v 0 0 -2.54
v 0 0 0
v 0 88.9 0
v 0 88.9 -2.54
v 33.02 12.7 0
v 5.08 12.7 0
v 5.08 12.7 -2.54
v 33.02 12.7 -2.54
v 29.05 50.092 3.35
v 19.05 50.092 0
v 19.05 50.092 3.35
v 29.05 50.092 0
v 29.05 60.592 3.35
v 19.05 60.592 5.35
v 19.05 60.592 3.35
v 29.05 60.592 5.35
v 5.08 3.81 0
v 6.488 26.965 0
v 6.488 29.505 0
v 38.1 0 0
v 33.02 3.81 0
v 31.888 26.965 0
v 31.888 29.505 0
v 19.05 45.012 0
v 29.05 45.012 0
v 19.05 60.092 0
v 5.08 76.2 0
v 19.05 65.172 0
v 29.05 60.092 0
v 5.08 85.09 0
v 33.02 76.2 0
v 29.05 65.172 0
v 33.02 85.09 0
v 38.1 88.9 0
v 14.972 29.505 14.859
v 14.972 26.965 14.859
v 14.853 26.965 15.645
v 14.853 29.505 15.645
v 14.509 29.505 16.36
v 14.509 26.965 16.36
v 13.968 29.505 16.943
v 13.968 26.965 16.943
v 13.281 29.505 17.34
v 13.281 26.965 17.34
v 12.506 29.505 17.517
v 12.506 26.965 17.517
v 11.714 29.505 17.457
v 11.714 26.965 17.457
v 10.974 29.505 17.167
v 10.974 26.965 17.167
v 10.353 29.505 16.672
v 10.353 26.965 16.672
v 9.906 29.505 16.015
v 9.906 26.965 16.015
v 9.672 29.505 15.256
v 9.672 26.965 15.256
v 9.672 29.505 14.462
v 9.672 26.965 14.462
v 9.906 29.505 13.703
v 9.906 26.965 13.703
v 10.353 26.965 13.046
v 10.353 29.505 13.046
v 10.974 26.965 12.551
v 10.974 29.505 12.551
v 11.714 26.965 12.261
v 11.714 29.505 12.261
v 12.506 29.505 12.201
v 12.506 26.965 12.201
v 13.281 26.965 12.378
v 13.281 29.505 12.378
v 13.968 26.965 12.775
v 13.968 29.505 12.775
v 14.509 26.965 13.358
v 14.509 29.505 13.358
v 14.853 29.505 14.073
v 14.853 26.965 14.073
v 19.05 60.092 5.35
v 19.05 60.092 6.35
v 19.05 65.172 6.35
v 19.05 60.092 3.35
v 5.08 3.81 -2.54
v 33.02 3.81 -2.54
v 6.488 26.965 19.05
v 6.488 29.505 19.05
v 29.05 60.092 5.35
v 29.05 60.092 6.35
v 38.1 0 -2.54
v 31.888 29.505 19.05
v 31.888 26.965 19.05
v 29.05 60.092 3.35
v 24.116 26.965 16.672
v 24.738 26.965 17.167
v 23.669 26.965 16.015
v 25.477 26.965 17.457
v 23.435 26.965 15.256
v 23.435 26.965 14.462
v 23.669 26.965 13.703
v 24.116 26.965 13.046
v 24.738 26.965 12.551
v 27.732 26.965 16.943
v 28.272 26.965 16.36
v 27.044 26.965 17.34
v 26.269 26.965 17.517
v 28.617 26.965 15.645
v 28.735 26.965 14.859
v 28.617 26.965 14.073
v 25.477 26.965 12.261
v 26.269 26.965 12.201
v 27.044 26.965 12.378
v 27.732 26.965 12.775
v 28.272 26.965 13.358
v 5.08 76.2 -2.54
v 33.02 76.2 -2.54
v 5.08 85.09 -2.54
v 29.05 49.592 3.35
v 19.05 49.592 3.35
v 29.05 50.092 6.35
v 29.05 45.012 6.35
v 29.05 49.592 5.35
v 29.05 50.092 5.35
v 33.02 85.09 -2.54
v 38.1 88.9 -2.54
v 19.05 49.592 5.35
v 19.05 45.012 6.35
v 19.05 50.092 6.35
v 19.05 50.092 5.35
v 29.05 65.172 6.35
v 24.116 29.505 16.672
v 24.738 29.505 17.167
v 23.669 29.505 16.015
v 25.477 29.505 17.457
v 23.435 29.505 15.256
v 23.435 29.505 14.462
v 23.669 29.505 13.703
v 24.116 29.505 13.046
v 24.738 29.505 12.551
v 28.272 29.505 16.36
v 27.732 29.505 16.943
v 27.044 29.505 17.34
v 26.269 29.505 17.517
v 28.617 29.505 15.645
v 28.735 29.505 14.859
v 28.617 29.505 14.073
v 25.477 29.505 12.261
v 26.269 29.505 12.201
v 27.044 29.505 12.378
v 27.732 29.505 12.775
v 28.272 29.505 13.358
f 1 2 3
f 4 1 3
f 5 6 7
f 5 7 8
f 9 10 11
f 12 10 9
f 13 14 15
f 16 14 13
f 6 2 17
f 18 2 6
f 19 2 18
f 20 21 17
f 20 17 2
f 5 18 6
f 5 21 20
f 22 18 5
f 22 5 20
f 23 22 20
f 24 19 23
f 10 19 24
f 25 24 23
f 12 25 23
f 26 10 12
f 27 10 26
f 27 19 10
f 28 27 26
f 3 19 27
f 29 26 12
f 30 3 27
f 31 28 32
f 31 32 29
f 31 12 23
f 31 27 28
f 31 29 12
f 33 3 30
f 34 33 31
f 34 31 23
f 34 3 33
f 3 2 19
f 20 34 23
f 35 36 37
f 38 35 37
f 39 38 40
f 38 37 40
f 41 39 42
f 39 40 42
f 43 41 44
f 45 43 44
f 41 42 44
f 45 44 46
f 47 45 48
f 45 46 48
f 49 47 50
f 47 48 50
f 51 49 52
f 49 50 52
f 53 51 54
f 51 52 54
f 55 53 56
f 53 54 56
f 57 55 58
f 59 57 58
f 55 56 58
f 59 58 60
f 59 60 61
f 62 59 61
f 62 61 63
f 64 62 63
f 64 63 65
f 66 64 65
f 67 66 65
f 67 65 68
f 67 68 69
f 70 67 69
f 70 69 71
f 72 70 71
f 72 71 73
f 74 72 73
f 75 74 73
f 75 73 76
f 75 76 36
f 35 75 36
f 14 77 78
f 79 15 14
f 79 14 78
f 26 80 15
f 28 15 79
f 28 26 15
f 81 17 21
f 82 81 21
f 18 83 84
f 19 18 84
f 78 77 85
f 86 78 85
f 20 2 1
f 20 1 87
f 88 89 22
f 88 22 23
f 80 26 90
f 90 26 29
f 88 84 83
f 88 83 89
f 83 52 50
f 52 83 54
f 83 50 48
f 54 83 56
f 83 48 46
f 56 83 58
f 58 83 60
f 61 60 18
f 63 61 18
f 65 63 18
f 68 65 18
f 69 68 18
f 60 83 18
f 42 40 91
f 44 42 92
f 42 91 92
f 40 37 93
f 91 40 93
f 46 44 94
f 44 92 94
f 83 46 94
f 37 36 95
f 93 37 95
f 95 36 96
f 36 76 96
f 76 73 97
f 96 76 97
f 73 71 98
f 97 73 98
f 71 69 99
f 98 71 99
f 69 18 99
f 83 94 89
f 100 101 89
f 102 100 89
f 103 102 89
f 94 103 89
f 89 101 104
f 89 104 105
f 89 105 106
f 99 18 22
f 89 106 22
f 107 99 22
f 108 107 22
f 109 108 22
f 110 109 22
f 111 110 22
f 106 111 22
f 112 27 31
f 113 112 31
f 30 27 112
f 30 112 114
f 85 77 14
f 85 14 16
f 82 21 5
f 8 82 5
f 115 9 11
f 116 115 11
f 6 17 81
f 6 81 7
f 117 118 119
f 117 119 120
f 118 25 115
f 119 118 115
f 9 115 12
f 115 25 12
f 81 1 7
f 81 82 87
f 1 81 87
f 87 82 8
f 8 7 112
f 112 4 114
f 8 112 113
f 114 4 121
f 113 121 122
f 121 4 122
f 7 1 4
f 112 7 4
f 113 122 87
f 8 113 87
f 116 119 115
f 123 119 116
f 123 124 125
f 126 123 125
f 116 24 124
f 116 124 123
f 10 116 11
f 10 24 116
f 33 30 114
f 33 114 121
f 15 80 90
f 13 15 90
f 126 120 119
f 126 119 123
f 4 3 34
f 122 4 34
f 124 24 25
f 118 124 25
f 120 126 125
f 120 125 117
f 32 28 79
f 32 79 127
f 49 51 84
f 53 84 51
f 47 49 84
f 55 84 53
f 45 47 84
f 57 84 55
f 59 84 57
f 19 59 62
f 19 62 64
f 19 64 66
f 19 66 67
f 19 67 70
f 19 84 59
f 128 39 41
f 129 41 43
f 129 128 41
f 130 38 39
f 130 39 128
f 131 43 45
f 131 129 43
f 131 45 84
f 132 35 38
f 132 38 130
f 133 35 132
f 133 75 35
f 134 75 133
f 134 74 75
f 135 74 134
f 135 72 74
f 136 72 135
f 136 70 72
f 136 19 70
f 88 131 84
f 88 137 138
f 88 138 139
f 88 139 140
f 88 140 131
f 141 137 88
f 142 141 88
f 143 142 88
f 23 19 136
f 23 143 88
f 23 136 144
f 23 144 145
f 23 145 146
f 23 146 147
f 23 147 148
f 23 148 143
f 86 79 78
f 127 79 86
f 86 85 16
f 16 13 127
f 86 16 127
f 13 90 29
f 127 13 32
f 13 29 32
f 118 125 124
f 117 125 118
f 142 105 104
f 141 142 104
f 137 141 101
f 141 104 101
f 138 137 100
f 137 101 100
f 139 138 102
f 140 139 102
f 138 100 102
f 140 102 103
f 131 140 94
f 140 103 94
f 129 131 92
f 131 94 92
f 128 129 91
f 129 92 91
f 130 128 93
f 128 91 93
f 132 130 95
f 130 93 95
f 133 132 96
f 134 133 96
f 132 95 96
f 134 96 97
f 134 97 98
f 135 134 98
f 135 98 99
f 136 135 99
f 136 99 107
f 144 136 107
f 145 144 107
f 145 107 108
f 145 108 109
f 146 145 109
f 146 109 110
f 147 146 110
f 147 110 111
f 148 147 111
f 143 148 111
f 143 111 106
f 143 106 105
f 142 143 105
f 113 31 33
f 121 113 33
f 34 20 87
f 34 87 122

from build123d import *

# Parameters (mm, degrees)
F1_W      = 38.1
F1_H      = 88.9
F2_DEPTH  = 2.54
F0_W      = 10
F0_H      = 5.08
F0_W_2    = 25.4
F0_H_2    = 2.54
F3_DEPTH  = 6.35
F4_W      = 10
F4_H      = 2
F5_DEPTH  = 0.5
F6_W      = 10
F6_H      = 2
F7_DEPTH  = 0.5
F8_DEPTH  = 12.7
F9_R      = 2.665
F10_DEPTH = 61.9361865292
F11_W     = 27.94
F11_H     = 8.89
F12_DEPTH = 25.4


with BuildPart() as f2:
    # F1 (on Top) → F2 (new body)
    with BuildSketch(Plane.XY):
        with Locations((19.05, 44.45)):
            Rectangle(F1_W, F1_H)
    extrude(amount=-F2_DEPTH)

    # F0 (on Top) → F3 (join)
    with BuildSketch(Plane.XY):
        with Locations((24.05, 62.6320488313)):
            Rectangle(F0_W, F0_H)
        with Locations((24.05, 47.5520488313)):
            Rectangle(F0_W, F0_H)
        with Locations((19.1884456806, 28.2348134708)):
            Rectangle(F0_W_2, F0_H_2)
    extrude(amount=F3_DEPTH)

    # F4 (on face) → F5 (cut)
    with BuildSketch(Plane(origin=(0, 50.0920488313, 0), x_dir=(-1, 0, 0), z_dir=(0, 1, 0))):
        with Locations((-24.05, 4.35)):
            Rectangle(F4_W, F4_H)
    extrude(amount=-F5_DEPTH, mode=Mode.SUBTRACT)

    # F6 (on face) → F7 (cut)
    with BuildSketch(Plane.XZ.offset(-60.0920488313)):
        with Locations((24.05, 4.35)):
            Rectangle(F6_W, F6_H)
    extrude(amount=-F7_DEPTH, mode=Mode.SUBTRACT)

    # F8 (add): a face of the model
    f8_faces = [f2.faces().sort_by_distance(p)[0] for p in [
        (19.1884456806, 28.2348134708, 6.35),
    ]]
    extrude(f8_faces, amount=F8_DEPTH)

    # F9 (on face) → F10 (cut, through all)
    with BuildSketch(Plane.XZ.offset(-26.9648134708)):
        with Locations((12.3068671674, 14.8589983582)):
            Circle(F9_R)
        with Locations((26.0700241938, 14.8589983582)):
            Circle(F9_R)
    extrude(amount=-F10_DEPTH, mode=Mode.SUBTRACT)

    # F11 (on face) → F12 (cut)
    with BuildSketch(Plane.XY):
        with Locations((19.05, 80.645)):
            Rectangle(F11_W, F11_H)
        with Locations((19.05, 8.255)):
            Rectangle(F11_W, F11_H)
    extrude(amount=-F12_DEPTH, mode=Mode.SUBTRACT)


solid = f2.part
